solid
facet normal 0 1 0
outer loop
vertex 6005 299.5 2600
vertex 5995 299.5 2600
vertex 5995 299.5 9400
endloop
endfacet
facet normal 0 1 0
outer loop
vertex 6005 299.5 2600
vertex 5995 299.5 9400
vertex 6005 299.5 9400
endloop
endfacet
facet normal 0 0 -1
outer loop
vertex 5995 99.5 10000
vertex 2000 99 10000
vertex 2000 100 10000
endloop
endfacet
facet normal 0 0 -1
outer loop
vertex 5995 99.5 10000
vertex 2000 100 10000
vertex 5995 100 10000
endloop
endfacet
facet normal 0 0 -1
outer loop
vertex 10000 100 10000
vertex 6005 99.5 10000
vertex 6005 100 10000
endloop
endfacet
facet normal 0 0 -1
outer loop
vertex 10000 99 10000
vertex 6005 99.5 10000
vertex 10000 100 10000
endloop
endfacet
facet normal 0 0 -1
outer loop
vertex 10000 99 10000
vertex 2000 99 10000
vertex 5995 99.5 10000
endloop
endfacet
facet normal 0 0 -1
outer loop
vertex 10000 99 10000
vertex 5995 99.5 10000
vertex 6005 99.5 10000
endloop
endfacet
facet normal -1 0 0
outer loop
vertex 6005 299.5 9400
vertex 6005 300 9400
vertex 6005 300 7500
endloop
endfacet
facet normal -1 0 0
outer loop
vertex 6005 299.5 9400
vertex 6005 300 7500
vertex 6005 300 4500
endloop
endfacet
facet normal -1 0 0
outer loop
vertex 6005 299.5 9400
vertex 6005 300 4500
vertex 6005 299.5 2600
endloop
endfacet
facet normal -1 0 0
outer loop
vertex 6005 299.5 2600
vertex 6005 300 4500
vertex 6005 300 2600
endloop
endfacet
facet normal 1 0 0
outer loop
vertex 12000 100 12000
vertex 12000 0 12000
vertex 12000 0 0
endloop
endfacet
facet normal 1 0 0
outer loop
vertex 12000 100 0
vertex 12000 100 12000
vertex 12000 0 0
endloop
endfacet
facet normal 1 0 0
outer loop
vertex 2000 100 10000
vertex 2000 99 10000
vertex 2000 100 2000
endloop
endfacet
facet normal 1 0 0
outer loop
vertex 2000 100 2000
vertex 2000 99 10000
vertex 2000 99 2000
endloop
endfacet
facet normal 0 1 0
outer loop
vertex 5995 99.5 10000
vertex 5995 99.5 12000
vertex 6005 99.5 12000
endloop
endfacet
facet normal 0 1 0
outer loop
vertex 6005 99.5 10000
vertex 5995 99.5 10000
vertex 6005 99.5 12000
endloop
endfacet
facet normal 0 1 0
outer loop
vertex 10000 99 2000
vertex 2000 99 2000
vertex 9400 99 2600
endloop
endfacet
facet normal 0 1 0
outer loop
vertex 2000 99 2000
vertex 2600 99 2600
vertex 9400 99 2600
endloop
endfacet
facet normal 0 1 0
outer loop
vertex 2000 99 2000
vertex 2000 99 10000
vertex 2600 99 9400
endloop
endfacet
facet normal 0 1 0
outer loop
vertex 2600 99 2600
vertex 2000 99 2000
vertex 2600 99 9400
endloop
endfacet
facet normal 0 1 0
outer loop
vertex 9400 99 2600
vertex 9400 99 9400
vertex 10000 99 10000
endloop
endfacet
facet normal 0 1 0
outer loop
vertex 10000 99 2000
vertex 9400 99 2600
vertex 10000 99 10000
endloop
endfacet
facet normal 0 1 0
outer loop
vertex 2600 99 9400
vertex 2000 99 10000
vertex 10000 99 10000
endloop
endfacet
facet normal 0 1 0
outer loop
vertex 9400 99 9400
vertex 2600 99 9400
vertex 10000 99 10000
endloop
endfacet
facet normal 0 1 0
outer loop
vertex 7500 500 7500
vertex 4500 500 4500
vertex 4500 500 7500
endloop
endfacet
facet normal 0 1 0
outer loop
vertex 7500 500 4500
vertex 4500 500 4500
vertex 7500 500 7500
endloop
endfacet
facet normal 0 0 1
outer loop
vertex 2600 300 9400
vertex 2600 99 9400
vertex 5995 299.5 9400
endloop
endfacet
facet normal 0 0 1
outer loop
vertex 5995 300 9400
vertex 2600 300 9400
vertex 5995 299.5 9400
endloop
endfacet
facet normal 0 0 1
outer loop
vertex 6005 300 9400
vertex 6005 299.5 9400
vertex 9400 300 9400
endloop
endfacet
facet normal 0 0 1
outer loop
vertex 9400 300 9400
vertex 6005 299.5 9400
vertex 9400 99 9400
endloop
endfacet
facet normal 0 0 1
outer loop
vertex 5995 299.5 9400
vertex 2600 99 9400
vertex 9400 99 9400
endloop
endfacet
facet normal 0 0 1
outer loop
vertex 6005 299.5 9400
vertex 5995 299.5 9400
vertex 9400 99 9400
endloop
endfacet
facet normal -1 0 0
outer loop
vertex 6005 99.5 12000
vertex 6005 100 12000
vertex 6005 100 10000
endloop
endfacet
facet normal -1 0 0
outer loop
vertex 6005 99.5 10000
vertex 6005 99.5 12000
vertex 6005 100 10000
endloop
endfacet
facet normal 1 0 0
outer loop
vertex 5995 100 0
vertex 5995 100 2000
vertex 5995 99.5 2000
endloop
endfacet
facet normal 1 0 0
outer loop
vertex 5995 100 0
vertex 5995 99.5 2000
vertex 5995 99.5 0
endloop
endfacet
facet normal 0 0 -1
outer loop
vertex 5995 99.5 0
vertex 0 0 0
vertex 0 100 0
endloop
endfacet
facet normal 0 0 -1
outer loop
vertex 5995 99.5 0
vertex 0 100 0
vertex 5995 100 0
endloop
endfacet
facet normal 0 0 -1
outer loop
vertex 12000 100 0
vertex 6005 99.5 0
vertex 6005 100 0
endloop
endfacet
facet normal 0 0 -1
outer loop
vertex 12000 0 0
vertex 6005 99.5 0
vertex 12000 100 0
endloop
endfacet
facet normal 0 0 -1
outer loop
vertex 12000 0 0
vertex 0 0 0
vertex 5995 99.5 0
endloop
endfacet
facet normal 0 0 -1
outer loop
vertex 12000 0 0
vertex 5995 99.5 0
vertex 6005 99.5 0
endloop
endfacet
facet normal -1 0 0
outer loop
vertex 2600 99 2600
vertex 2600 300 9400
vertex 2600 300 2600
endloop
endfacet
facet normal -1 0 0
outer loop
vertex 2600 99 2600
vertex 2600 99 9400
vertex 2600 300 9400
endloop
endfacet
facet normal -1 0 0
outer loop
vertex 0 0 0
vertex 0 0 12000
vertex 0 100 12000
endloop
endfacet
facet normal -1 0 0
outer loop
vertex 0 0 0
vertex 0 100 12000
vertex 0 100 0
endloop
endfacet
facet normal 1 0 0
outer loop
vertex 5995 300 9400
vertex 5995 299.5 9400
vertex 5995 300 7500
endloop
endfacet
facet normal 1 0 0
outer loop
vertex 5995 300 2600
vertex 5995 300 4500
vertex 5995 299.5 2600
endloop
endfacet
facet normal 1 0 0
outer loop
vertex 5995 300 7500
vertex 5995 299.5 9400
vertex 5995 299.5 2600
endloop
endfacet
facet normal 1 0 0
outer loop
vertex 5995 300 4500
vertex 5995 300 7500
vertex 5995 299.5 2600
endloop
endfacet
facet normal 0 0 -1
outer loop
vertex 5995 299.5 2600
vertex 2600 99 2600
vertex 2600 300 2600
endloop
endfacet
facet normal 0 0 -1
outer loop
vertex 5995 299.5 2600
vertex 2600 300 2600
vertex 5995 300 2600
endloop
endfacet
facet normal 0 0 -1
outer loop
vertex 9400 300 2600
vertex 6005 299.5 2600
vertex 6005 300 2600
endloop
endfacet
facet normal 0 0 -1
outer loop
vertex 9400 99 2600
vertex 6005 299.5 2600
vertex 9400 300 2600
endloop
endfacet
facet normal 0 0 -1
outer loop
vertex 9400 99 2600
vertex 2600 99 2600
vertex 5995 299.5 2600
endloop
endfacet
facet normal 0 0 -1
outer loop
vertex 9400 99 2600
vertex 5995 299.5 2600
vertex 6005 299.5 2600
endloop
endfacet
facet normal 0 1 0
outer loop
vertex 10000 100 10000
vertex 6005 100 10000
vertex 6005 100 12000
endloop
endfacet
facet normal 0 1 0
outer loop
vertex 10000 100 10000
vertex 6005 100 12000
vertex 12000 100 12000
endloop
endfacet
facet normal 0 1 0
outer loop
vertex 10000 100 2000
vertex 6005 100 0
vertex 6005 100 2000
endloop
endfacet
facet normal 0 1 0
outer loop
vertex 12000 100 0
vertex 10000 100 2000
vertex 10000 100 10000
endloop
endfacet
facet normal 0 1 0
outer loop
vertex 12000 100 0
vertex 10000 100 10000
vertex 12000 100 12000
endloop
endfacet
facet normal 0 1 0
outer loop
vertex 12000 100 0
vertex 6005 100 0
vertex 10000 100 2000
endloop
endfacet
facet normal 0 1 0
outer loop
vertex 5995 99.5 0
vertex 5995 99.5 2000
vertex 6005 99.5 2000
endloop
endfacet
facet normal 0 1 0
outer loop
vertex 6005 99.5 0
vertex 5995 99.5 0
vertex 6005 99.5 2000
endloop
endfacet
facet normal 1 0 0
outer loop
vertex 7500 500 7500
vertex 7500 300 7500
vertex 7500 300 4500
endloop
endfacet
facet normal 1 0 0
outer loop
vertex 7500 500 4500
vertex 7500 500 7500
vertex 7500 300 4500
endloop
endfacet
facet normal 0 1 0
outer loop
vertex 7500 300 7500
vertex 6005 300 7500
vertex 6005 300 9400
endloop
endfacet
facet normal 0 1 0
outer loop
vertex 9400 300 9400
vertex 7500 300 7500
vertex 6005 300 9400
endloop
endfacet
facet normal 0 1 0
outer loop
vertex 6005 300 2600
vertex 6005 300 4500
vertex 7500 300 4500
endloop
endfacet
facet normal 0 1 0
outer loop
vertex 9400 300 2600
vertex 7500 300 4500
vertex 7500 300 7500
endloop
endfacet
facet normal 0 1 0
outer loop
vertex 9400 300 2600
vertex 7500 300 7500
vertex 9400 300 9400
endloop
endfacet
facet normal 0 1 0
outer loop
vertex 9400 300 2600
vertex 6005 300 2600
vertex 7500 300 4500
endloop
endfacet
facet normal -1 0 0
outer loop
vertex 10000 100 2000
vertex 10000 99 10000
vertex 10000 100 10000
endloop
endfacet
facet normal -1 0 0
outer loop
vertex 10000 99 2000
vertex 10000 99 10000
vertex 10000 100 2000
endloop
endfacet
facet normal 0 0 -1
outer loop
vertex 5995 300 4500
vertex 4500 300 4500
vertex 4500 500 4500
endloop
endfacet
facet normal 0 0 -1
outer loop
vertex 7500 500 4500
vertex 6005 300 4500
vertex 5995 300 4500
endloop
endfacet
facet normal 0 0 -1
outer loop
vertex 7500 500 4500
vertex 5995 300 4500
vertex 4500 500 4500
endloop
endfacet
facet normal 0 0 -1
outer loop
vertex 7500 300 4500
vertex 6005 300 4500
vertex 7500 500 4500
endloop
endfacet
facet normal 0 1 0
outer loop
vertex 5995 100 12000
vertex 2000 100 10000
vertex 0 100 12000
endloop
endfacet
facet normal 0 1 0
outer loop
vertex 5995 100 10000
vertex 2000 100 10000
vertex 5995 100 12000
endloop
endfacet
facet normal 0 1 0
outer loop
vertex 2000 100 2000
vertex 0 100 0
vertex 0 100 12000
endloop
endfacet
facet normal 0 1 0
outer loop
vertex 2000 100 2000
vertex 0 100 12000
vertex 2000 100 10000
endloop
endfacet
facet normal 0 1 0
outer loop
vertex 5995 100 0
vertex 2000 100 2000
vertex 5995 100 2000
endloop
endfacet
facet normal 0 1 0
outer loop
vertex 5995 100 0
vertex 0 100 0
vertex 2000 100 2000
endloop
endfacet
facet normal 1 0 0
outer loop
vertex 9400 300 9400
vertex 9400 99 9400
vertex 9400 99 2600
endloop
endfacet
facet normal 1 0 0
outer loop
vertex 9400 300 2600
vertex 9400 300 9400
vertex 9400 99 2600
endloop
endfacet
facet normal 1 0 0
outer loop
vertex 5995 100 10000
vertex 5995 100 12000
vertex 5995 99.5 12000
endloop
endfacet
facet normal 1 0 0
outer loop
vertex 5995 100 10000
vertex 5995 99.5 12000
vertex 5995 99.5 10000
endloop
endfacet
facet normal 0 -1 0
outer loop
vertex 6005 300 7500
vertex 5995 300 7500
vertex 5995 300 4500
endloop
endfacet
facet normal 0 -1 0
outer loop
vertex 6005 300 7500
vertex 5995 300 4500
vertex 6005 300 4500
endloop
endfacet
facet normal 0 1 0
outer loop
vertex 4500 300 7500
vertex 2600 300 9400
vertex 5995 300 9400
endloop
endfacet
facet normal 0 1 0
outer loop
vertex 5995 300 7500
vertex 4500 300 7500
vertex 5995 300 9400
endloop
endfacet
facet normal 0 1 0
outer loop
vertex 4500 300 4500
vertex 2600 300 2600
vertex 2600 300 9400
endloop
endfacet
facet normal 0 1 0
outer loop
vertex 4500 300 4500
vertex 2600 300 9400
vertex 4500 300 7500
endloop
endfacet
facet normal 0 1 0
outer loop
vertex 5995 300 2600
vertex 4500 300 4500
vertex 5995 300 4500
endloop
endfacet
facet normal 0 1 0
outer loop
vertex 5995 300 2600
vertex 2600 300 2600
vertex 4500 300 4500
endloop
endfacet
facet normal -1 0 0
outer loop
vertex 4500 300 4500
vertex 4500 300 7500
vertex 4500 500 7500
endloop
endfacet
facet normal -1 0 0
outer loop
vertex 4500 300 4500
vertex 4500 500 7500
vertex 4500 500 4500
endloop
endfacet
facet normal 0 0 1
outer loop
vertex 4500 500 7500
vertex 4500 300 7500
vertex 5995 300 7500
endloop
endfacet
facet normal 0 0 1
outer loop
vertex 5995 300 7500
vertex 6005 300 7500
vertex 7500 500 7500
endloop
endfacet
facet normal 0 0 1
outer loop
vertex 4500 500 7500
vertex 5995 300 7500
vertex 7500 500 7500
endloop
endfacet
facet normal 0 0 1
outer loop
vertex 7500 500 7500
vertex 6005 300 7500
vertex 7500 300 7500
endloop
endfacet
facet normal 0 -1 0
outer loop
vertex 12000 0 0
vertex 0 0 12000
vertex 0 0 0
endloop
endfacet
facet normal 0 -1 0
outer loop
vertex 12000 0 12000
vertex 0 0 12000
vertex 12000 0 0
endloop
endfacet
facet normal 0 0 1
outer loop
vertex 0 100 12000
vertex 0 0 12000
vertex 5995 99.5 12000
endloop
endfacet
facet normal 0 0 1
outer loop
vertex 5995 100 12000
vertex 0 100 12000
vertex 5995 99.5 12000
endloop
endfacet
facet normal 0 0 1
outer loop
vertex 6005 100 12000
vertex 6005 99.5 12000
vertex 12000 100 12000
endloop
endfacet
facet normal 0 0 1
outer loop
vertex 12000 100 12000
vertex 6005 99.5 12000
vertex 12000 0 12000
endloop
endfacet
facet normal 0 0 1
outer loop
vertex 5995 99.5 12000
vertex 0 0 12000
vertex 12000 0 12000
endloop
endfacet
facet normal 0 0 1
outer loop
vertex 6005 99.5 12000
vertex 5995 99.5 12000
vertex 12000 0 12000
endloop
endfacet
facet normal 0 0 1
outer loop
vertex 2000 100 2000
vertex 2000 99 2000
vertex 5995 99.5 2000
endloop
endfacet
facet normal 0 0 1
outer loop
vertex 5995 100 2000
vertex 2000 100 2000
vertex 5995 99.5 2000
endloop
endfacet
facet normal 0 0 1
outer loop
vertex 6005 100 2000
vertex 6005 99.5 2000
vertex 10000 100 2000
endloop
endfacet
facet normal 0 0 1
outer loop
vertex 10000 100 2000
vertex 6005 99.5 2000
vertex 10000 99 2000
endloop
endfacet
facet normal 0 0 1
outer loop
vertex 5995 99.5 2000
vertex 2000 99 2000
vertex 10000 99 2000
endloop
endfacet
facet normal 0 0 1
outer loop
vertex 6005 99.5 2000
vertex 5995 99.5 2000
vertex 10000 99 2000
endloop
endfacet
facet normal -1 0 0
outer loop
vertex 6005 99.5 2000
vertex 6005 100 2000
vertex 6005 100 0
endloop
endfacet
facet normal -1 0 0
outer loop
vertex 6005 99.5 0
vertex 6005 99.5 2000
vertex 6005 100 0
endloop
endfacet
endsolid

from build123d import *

# Parameters (mm, degrees)
SKETCH1_W             = 12000
SKETCH1_H             = 12000
SKETCH1_W_2           = 8000
SKETCH1_H_2           = 8000
BOSS_EXTRUDE1_DEPTH   = 100
SKETCH1_W_3           = 6800
SKETCH1_H_3           = 6800
BOSS_EXTRUDE1_2_DEPTH = 100
SKETCH2_W             = 8000
SKETCH2_H             = 8000
SKETCH2_W_2           = 6800
SKETCH2_H_2           = 6800
BOSS_EXTRUDE3_DEPTH   = 99
SKETCH3_W             = 10
SKETCH3_H             = 12000
CUT_EXTRUDE1_DEPTH    = 0.5
SKETCH4_W             = 3395
SKETCH4_H             = 6800
BOSS_EXTRUDE4_DEPTH   = 200
SKETCH5_W             = 10
SKETCH5_H             = 6800
BOSS_EXTRUDE5_DEPTH   = 200
SKETCH6_W             = 3000
SKETCH6_H             = 3000
BOSS_EXTRUDE6_DEPTH   = 200


with BuildPart() as part:
    # Sketch1 → Boss-Extrude1 (new body)
    with BuildSketch(Plane(origin=(0, 0, 0), x_dir=(1, 0, 0), z_dir=(0, 1, 0))):
        with Locations((6000, -6000)):
            Rectangle(SKETCH1_W, SKETCH1_H)
        with Locations((6000, -6000)):
            Rectangle(SKETCH1_W_2, SKETCH1_H_2, mode=Mode.SUBTRACT)
    extrude(amount=BOSS_EXTRUDE1_DEPTH)



with BuildPart() as body_2:
    # Sketch1 → Boss-Extrude1 2 (new body)
    with BuildSketch(Plane(origin=(0, 0, 0), x_dir=(1, 0, 0), z_dir=(0, 1, 0))):
        with Locations((6000, -6000)):
            Rectangle(SKETCH1_W_3, SKETCH1_H_3)
    extrude(amount=BOSS_EXTRUDE1_2_DEPTH)


with BuildPart() as part_1:
    add(part.part)

    add(body_2.part)  # Boss-Extrude3 merges body 2
    # Sketch2 → Boss-Extrude3 (add)
    with BuildSketch(Plane.XZ):
        with Locations((6000, 6000)):
            Rectangle(SKETCH2_W, SKETCH2_H)
        with Locations((6000, 6000)):
            Rectangle(SKETCH2_W_2, SKETCH2_H_2, mode=Mode.SUBTRACT)
    extrude(amount=-BOSS_EXTRUDE3_DEPTH)

    # Sketch3 → Cut-Extrude1 (cut)
    with BuildSketch(Plane(origin=(0, 100, 0), x_dir=(1, 0, 0), z_dir=(0, 1, 0))):
        with Locations((6000, -6000)):
            Rectangle(SKETCH3_W, SKETCH3_H)
    extrude(amount=-CUT_EXTRUDE1_DEPTH, mode=Mode.SUBTRACT)

    # Sketch4 → Boss-Extrude4 (add)
    with BuildSketch(Plane(origin=(0, 100, 0), x_dir=(1, 0, 0), z_dir=(0, 1, 0))):
        with Locations((4297.5, -6000)):
            Rectangle(SKETCH4_W, SKETCH4_H)
        with Locations((7702.5, -6000)):
            Rectangle(SKETCH4_W, SKETCH4_H)
    extrude(amount=BOSS_EXTRUDE4_DEPTH)

    # Sketch5 → Boss-Extrude5 (add)
    with BuildSketch(Plane(origin=(0, 99.5, 0), x_dir=(1, 0, 0), z_dir=(0, 1, 0))):
        with Locations((6000, -6000)):
            Rectangle(SKETCH5_W, SKETCH5_H)
    extrude(amount=BOSS_EXTRUDE5_DEPTH)

    # Sketch6 → Boss-Extrude6 (add)
    with BuildSketch(Plane(origin=(0, 300, 0), x_dir=(1, 0, 0), z_dir=(0, 1, 0))):
        with Locations((6000, -6000)):
            Rectangle(SKETCH6_W, SKETCH6_H)
    extrude(amount=BOSS_EXTRUDE6_DEPTH)


solid = part_1.part
